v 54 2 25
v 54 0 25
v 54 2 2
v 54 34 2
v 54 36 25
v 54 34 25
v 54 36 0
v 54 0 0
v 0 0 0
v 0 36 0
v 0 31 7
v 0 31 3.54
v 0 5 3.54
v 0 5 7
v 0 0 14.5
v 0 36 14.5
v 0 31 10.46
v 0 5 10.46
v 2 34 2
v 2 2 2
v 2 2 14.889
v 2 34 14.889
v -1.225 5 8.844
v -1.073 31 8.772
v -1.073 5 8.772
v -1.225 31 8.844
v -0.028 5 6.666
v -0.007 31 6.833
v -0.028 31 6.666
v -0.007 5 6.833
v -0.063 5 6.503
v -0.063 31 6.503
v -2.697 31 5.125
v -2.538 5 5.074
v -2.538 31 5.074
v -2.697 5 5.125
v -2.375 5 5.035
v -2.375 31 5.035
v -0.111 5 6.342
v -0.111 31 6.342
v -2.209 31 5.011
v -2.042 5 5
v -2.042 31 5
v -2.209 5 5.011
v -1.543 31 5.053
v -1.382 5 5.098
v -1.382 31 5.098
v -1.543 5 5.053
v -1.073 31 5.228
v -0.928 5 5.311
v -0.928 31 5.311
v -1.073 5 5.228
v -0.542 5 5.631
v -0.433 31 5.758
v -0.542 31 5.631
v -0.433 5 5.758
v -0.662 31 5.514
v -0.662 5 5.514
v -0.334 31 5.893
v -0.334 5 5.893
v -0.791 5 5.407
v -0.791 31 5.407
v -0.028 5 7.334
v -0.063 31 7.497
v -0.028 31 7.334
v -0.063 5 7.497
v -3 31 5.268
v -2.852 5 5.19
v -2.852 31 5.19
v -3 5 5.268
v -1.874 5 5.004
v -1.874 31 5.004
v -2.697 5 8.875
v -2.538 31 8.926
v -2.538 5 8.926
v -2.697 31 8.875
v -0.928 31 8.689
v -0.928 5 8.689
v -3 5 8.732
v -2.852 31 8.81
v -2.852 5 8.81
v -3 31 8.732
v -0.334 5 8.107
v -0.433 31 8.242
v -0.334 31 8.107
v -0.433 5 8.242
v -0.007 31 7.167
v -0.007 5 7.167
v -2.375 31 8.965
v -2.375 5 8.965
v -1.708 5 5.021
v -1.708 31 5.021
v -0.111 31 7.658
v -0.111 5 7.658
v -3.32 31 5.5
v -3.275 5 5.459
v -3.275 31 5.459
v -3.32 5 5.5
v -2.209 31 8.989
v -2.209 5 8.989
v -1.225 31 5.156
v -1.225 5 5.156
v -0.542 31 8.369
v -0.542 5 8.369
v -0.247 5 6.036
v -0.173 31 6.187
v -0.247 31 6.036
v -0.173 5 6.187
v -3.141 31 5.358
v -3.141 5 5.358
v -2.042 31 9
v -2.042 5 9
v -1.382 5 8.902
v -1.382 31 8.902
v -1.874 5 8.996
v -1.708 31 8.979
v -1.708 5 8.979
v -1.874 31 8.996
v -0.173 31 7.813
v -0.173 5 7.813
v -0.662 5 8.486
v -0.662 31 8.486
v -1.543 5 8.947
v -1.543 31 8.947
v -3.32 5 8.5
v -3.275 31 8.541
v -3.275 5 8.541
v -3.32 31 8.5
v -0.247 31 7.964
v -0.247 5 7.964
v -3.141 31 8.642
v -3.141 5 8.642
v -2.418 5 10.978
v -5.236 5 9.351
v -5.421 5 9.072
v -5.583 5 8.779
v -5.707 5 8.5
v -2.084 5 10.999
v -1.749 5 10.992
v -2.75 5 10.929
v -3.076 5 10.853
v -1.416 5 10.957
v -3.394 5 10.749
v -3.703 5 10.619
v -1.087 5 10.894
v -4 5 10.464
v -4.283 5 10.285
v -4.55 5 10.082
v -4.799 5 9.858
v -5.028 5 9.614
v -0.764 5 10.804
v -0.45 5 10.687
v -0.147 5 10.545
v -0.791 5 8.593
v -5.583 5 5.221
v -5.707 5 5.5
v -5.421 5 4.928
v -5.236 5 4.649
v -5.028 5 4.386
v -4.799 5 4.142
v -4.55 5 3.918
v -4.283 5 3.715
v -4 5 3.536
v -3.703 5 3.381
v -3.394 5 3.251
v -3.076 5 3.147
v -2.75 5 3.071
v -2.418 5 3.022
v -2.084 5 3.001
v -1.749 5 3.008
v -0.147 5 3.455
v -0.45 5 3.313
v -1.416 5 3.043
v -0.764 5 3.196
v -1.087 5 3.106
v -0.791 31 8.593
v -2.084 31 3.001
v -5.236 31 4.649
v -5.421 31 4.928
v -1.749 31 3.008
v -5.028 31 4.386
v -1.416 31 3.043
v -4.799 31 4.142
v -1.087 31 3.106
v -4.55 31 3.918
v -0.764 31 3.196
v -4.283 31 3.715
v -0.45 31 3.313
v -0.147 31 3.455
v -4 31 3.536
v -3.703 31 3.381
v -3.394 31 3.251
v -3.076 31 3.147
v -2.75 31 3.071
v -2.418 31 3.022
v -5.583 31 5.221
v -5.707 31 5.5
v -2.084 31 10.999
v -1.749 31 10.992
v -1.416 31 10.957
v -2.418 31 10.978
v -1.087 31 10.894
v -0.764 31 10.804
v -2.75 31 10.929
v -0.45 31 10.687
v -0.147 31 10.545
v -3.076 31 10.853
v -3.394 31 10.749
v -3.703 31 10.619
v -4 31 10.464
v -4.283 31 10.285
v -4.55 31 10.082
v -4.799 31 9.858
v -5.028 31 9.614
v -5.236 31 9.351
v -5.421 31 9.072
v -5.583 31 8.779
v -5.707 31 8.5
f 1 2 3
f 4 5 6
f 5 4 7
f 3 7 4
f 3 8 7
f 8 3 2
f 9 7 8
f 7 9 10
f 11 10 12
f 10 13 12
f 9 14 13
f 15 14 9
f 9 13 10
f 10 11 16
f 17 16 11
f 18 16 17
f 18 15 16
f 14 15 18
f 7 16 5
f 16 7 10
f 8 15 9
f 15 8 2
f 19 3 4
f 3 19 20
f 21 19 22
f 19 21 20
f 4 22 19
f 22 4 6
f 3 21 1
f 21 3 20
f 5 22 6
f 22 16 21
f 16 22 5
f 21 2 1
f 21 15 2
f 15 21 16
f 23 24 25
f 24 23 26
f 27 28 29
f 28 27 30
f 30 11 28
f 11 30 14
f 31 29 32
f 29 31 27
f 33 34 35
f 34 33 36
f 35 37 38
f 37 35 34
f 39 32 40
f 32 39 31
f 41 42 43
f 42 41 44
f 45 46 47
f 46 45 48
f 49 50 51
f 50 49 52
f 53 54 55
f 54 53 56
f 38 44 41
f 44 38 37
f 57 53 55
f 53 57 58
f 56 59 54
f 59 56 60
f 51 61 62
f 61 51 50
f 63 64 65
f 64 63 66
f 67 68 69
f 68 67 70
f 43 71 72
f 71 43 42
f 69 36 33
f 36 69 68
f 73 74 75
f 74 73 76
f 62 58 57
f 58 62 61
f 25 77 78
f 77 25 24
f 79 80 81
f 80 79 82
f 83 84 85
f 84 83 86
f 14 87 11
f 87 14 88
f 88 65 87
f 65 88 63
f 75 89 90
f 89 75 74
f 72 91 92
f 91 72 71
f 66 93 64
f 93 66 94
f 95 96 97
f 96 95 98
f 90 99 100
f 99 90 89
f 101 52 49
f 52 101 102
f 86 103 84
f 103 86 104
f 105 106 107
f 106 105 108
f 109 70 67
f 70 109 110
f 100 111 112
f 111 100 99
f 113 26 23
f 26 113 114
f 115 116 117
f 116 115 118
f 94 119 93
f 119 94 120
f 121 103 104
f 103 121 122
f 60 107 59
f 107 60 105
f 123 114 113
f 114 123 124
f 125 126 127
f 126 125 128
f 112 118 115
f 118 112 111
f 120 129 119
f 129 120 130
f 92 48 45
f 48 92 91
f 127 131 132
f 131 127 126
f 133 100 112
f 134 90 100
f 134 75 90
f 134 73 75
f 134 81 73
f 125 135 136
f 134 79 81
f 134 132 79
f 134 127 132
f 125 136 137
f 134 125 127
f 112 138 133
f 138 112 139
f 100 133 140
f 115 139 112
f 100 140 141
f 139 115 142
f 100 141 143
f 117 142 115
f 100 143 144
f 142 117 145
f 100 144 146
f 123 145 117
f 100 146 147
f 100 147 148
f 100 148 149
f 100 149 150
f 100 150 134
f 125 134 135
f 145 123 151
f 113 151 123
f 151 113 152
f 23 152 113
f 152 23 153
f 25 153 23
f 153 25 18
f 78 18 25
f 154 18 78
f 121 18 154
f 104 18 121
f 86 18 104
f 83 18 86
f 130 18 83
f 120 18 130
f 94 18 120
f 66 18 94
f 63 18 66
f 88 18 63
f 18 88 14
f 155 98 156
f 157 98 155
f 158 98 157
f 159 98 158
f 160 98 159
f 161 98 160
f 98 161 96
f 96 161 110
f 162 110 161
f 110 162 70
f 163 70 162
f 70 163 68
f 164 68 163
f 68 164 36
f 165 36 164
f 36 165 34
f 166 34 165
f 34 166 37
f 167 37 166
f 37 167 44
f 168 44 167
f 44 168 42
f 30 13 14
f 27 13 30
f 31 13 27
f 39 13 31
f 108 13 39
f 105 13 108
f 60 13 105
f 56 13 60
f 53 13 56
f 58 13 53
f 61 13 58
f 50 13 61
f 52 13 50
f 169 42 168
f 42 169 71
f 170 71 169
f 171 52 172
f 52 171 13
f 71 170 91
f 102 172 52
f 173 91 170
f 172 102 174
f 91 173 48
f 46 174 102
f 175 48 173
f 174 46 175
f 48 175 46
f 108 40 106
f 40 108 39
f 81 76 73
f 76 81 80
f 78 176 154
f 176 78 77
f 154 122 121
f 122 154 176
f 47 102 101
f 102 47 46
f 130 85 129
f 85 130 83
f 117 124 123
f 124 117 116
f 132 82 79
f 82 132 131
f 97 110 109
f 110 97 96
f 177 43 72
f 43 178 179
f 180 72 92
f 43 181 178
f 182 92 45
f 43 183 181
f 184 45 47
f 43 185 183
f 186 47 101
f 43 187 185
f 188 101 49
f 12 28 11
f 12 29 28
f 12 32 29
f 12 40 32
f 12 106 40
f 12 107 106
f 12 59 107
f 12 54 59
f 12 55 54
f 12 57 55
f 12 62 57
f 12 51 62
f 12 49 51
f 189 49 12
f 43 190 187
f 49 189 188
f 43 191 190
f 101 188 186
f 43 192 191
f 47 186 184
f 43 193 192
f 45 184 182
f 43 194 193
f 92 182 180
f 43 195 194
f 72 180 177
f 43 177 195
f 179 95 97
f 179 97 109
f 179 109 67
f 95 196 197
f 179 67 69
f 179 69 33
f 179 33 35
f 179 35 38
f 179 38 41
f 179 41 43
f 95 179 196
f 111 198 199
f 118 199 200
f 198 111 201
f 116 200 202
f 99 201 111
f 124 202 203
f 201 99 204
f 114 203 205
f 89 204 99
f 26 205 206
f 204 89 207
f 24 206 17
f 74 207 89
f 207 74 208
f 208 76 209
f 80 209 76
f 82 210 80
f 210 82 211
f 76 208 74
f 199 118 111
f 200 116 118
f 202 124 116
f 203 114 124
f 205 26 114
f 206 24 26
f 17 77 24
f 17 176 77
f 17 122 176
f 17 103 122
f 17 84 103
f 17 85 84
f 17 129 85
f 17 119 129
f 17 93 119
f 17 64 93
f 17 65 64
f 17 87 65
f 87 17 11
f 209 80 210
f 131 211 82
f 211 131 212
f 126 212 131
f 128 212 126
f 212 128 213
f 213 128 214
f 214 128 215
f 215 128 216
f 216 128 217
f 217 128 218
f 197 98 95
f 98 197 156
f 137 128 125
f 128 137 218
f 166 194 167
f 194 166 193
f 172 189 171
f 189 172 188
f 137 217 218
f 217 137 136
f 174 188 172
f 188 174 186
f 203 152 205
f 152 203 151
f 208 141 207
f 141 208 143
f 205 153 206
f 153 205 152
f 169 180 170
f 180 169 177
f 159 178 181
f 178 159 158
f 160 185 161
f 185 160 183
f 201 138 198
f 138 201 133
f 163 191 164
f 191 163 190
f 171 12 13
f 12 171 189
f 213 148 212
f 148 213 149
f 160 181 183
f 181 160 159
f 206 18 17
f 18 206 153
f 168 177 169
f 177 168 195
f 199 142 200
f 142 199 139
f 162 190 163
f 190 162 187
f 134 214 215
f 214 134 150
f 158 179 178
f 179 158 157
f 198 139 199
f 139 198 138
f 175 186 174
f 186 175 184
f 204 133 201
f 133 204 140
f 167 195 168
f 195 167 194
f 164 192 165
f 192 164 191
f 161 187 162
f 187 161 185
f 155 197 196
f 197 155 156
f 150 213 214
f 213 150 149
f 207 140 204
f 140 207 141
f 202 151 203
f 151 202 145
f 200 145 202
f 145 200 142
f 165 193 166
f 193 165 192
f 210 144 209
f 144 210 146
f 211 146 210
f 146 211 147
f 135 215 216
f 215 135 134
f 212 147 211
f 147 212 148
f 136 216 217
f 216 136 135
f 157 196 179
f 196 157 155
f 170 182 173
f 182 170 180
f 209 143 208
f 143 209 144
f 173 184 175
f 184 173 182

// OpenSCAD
// ----- CONFIG -----
wallThickness = 2;
length = 52 + wallThickness; // length in x direction
upperHeight = 23 + wallThickness;
lowerHeight = 12.5 + wallThickness;
topPartOffset = 10;
heightDifference = upperHeight - lowerHeight;
backInnerLength = 32; // width, without the sides
backOuterLength = backInnerLength + 2*wallThickness;
hingeOffset = 5;
hingeLength = backOuterLength - (2 * hingeOffset);
femaleHingeInnerRadius = 2;
femaleHingeOuterRadius = 4;
hingeHeight = 7;
maleHingeRadius = femaleHingeInnerRadius * 0.8;
maleHingeSpacing = 2;
handleLength = 23;
handleThickness = 1.5;

print = true;
printBottom = true;
$fn = 75;

debug = false; // toggles stacked view/debugging
debugBottom = false;
debugHinges = true; // toggles only showing hinges
debugFemaleHinge = false;
debugMaleHinge = true;
offsetParts = true;

// render() {

// bottom part
if (!debug || (debug && (debugBottom || debugHinges))) {
  if ((!debug || !debugBottom) || (debug && !debugHinges)) {
    if (print) {
      if (printBottom) {
        bottomPart();
      }
    } else {
      bottomPart();
    }
  } else {
    bottomPart();
  }
}

// top part
if (!debug || (debug && (!debugBottom || debugHinges))) {
  if ((!debug || debugBottom) || (debug && !debugHinges)) {
    if (print) {
      if (!printBottom) {
        translate([-length*1, upperHeight*2, upperHeight+lowerHeight]) rotate([180, 0, 0]) topPart();
      }
    } else {
      if (!debug && offsetParts) {
        translate([0, 0, 1]) topPart();
      } else {
        topPart();
      }
    }
  } else {
    topPart();
  }
  
}

// ----- MODULES ------

module bottomPart() {
  if (debug && (debugHinges || debugFemaleHinge)) {
    translate([0, 0, -7]) femaleHinge();
  } else {
    union() {
      bottomMain();
      translate([-wallThickness, 0, 0]) femaleHinge();
    }
  }
}

module topPart() {
  if (debug && (debugHinges || debugMaleHinge)) {
    maleHinge();
  } else {
    union() {
      translate([-femaleHingeInnerRadius, 0, hingeHeight]) rotate([0, 90, 0]) maleHinge();
      topMain();
    }
  }
}

module femaleHinge() {
  if (!debug || debugFemaleHinge) {
      translate([-2, 0, 0]);
  }
  difference() {
    translate([0, hingeOffset, hingeHeight]) rotate([270, 0, 0]) cylinder(r=femaleHingeOuterRadius, h=hingeLength, center=false);
    union() {
      translate([0, hingeOffset, hingeHeight]) rotate([270, 0, 0]) cylinder(r=femaleHingeInnerRadius, h=hingeLength, center=false);
      translate([-1.5, hingeOffset+(hingeLength/2), hingeHeight]) hull() {
        cube([1, hingeLength, 3], center=true);
        translate([-3, 0, 0]) cube([1, hingeLength, 3], center=true);
      }
    }
  }
}

module maleHinge() {
  union() {
    // main part
    translate([0, hingeOffset-maleHingeSpacing, 0]) rotate([270, 0, 0]) cylinder(r=maleHingeRadius, h=hingeLength+2*maleHingeSpacing, center=false);

    difference() {
      union() {
        // right handle 
        translate([0, hingeOffset-handleThickness-maleHingeSpacing, 0]) hull() {
          rotate([270, 0, 0]) cylinder(r=maleHingeRadius*0.8, h=handleThickness, center=false);
          translate([-handleLength, 0, handleThickness*0.5]) cube([handleThickness, handleThickness, handleThickness*0.5], center=false);
        }
        
        // left handle
        translate([0, hingeOffset+hingeLength+maleHingeSpacing, 0]) hull() {
          rotate([270, 0, 0]) cylinder(r=maleHingeRadius*0.8, h=handleThickness, center=false);
          translate([-handleLength, 0, handleThickness*0.5]) cube([handleThickness, handleThickness, handleThickness*0.5], center=false);
        }

        // connector
        #translate([-2*handleLength-3, hingeOffset-maleHingeSpacing-handleThickness, -handleThickness]) cube([2*handleLength-(femaleHingeOuterRadius+1), hingeLength+2*handleThickness+2*maleHingeSpacing, 2*handleThickness+0.5]);
      }

      translate([0, 0, -(maleHingeRadius*0.8+5)]) rotate([0, -acos((maleHingeRadius*0.8 + (maleHingeRadius*0.8-handleThickness*0.4))/(handleLength-2*maleHingeSpacing)), 0]) cube([5, hingeLength+hingeOffset*2, 100]);
    }
    // support bar
    // translate([-(femaleHingeOuterRadius+1), (hingeLength/2)+hingeOffset, 0]) cube([handleThickness, hingeLength, handleThickness], center=true);
    
  }
}

module topMain() {

  // translate([-9, (backInnerLength/2), 0]) cube([3, backInnerLength-2, 1], center = true);

  difference() {
    translate([0, 0, lowerHeight]) cube([length, backOuterLength, heightDifference+wallThickness+topPartOffset], center=false);
    difference() {
      cube([length+wallThickness, backOuterLength, 100]);
      translate([0, 0, lowerHeight]) rotate([0, -atan(heightDifference/length), 0]) cube([100, backOuterLength, 50]);
    }
    translate([wallThickness, wallThickness, lowerHeight]) cube([length-wallThickness, backInnerLength, heightDifference+topPartOffset], center=false);
  }
  
}

module bottomMain() {
  if (!debug || !debugFemaleHinge) {
    if (!debug || !debugBottom) {
      translate([0, 0, 0]);
    }

    difference() {
      cube([length, backOuterLength, upperHeight]);
      translate([2, 2, 2]) cube([length, backInnerLength, upperHeight]);
      translate([0, 0, lowerHeight]) rotate([0, -atan(heightDifference/length), 0]) cube([100, backOuterLength, 20]);
    }
  }
}

// }
